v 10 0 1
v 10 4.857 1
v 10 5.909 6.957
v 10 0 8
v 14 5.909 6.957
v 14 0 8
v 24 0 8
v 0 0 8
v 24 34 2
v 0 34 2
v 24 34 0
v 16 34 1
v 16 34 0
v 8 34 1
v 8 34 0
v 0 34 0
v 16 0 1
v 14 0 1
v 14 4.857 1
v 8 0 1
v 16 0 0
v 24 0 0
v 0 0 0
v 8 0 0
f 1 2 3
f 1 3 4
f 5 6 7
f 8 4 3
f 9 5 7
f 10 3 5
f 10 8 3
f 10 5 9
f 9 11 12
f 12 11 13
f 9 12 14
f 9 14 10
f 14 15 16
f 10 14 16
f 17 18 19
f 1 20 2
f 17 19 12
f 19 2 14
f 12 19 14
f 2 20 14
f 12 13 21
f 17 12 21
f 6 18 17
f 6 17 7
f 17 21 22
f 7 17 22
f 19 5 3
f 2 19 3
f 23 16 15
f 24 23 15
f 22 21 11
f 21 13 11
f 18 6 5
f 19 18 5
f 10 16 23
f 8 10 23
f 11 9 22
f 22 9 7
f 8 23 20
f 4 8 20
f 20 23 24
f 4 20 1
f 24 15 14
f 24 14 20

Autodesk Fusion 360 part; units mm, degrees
sketch "Sketch1" plane through (0, 0, 0) normal (0, 0, 1) x (1, 0, 0)
  line L0 (0, 0) -> (24, 0)
  line L1 (24, 0) -> (24, 34)
  line L2 (24, 34) -> (0, 34)
  line L3 (0, 34) -> (0, 0)
  line L4 (8, 34) -> (8, 0)
  line L5 (16, 34) -> (16, 0)
  dimension "d3" = 34
  dimension "d4" = 24
  dimension "d5" = 8
  dimension "d6" = 8
extrude "Extrude1" add sketch "Sketch1" along normal blind 1 contours L0 L2 L3 L4 | L0 L1 L2 L5 makes body 1 at (2.6667, 22.6667, 0) makes body 2 at (18.6667, 22.6667, 0)
sketch "Sketch2" plane through (0, 0, 0) normal (-1, 0, 0) x (0, -1, 0)
  line L0 (-34, 0) -> (0, 0)
  line L1 (0, 0) -> (0, 1)
  line L2 (0, 1) -> (-34, 1)
  line L3 (-34, 1) -> (-34, 0)
  line L4 (0, 1) -> (0, 8)
  line L5 (-34, 1) -> (-34, 2)
  line L6 (0, 8) -> (-34, 2)
  dimension "d9" = 7
  dimension "d12" = 1
extrude "Extrude3" add sketch "Sketch2" against normal up to surface (24 mm away) contours L2 L4 L5 L6 bodies 1 2
sketch "Sketch3" plane through (0, 1.3691, 7.7584) normal (0, 0.173785, 0.984784) x (-1, 0, 0)
  line L0 (-24, 1.3903) -> (-24, -33.1351)
  line L1 (-24, -33.1351) -> (0, -33.1351)
  line L2 (0, -33.1351) -> (0, 1.3903)
  line L3 (0, 1.3903) -> (-24, 1.3903)
  line L4 (-10, 1.3903) -> (-14, 1.3903)
  line L5 (-14, 1.3903) -> (-14, -4.6097)
  line L6 (-14, -4.6097) -> (-10, -4.6097)
  line L7 (-10, -4.6097) -> (-10, 1.3903)
  dimension "d15" = 4
  dimension "d16" = 6
extrude "Extrude4" cut sketch "Sketch3" along normal up to surface contours L3 L4 L5 L6 L7 end surface through (0, 0, 1) normal (0, 0, -1) offset 0 bodies 1
equation "Hoogte_SERVO = 34 mm" comment "Hoogte_SERVO"
equation "Breedte_SERVO = 24 mm" comment "Breedte_SERVO"
equation "d3 = Hoogte_SERVO"
equation "d4 = Breedte_SERVO"
equation "d6 = d5"
equation "d9 = 4 mm + 3 mm"
